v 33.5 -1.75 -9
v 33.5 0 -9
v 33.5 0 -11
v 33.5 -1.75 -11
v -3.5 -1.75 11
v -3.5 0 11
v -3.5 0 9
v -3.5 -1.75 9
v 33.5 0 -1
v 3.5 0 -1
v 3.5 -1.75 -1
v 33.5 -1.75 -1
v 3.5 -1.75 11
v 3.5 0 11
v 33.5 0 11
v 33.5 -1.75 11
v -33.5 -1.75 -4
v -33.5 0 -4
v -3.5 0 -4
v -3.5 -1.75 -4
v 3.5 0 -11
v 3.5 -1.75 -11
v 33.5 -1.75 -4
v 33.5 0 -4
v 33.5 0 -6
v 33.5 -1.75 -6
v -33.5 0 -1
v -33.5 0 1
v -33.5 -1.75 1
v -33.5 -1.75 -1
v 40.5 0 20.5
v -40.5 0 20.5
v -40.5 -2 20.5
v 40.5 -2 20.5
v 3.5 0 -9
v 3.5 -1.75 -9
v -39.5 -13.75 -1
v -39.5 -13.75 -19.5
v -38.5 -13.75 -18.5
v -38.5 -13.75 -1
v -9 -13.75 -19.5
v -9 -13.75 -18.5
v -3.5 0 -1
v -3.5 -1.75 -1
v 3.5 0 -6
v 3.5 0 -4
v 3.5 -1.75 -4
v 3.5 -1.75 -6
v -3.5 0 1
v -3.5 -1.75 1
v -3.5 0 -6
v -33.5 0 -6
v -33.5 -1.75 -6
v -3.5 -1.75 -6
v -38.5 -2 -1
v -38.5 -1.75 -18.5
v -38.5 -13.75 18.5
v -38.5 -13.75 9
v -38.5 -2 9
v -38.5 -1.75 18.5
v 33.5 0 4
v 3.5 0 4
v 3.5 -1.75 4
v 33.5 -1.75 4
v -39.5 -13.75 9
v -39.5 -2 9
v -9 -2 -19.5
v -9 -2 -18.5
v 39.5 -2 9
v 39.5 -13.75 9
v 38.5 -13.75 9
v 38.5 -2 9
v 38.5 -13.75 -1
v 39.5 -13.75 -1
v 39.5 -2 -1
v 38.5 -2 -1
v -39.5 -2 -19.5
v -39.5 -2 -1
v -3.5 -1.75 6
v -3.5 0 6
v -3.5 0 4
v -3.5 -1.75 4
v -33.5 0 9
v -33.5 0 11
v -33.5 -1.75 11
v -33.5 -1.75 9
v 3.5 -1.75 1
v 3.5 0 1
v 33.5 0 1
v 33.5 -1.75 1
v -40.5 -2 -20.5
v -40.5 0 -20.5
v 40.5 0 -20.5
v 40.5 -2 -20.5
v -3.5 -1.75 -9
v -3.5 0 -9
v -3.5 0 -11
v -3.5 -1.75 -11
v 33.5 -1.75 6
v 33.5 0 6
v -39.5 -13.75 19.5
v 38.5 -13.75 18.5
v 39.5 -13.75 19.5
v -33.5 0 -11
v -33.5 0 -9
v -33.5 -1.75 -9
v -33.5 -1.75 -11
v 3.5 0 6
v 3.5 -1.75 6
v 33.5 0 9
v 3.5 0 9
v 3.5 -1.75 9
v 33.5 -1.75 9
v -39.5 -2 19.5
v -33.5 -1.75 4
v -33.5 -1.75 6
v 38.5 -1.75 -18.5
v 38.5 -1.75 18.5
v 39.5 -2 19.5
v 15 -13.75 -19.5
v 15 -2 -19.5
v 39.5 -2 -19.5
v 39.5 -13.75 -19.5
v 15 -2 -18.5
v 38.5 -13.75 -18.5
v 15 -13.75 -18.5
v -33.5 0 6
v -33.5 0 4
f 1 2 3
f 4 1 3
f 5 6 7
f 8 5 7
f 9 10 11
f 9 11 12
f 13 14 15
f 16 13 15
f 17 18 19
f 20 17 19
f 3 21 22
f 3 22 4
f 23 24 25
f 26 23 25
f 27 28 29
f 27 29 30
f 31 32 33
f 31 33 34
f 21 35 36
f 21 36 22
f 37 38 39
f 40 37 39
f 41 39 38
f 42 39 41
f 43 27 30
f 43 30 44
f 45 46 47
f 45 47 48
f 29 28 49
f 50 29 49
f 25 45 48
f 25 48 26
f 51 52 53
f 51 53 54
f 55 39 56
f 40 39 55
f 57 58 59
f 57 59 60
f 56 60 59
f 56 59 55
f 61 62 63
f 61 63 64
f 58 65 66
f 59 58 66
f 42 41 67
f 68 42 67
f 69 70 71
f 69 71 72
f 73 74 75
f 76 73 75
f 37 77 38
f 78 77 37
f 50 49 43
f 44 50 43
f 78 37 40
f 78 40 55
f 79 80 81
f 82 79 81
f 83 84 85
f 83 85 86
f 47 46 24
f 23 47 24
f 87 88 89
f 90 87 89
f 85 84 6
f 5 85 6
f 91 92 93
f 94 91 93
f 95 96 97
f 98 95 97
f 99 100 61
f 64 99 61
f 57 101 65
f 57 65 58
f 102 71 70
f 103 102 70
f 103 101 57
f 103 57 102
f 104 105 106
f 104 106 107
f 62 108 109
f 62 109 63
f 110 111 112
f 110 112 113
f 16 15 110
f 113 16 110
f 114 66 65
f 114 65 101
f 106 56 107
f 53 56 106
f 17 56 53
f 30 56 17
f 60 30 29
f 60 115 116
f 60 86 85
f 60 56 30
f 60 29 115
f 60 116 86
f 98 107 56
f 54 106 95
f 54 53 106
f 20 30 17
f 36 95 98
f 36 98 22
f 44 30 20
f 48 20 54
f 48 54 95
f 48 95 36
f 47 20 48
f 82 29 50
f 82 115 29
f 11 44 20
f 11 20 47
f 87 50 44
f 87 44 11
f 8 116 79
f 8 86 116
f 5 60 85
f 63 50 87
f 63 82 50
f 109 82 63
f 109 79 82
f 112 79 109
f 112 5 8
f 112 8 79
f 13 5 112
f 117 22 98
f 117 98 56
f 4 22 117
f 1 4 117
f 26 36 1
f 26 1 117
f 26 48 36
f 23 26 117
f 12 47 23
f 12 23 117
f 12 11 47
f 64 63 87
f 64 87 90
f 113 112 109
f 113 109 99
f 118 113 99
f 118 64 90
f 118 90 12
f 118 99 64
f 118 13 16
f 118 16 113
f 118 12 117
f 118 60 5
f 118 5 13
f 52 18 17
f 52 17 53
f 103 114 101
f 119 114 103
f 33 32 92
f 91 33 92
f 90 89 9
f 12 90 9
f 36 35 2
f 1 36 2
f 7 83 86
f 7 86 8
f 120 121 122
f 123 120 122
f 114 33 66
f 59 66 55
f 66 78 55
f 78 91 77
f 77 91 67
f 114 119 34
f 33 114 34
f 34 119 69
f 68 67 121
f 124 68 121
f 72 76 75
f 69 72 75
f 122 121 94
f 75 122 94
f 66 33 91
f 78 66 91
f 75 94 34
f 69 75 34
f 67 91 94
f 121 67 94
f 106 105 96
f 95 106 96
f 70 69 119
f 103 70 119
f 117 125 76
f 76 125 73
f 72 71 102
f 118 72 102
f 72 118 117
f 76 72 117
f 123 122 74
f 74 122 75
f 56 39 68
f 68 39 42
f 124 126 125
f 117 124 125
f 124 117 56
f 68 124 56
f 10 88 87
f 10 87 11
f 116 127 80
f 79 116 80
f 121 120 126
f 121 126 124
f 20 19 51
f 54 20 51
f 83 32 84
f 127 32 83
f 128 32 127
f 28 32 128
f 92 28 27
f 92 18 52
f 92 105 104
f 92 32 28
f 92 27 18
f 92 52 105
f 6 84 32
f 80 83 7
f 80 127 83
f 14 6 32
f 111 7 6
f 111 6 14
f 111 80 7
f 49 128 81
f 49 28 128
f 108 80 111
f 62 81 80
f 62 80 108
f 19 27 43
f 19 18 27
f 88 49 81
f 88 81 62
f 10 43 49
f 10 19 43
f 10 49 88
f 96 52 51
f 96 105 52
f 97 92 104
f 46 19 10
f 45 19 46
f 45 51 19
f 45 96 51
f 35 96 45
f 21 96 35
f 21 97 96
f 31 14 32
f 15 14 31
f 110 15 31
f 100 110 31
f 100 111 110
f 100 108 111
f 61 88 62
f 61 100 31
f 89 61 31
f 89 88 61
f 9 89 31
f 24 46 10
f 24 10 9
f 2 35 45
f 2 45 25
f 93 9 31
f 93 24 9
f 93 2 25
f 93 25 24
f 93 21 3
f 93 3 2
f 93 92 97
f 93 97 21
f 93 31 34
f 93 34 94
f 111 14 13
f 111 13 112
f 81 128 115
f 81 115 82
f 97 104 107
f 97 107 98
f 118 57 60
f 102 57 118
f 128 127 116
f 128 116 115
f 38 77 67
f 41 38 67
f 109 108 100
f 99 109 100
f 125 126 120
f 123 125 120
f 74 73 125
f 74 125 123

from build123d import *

# Parameters (mm, degrees)
SKETCH011_W     = 81
SKETCH011_H     = 41
PAD002_DEPTH    = 2
SKETCH012_W     = 79
SKETCH012_H     = 39
PAD003_DEPTH    = 12
SKETCH059_W     = 77
SKETCH059_H     = 37
POCKET022_DEPTH = 12
SKETCH060_W     = 30
SKETCH060_H     = 2
POCKET023_DEPTH = 2
SKETCH061_W     = 24
SKETCH061_H     = 11.75
POCKET024_DEPTH = 2
SKETCH103_W     = 10
SKETCH103_H     = 11.75
POCKET038_DEPTH = 2
SKETCH104_W     = 10
SKETCH104_H     = 11.75
POCKET039_DEPTH = 2


with BuildPart() as part:
    # Sketch011 (on DatumPlane) → Pad002 (new body)
    with BuildSketch(Plane(origin=(0, 0, 0), x_dir=(1, 0, 0), z_dir=(0, 1, 0))):
        Rectangle(SKETCH011_W, SKETCH011_H)
    extrude(amount=-PAD002_DEPTH)

    # Sketch012 → Pad003 (join)
    with BuildSketch(Plane.XZ.offset(1.75)):
        Rectangle(SKETCH012_W, SKETCH012_H)
    extrude(amount=PAD003_DEPTH)

    # Sketch059 (on Face11 of Pad003) → Pocket022 (cut)
    with BuildSketch(Plane.XZ.offset(13.75)):
        Rectangle(SKETCH059_W, SKETCH059_H)
    extrude(amount=-POCKET022_DEPTH, mode=Mode.SUBTRACT)

    # Sketch060 (on Face4 of Pocket022) → Pocket023 (cut)
    with BuildSketch(Plane(origin=(0, 0, 0), x_dir=(1, 0, 0), z_dir=(0, 1, 0))):
        with Locations((18.5, -10)):
            Rectangle(SKETCH060_W, SKETCH060_H)
        with Locations((18.5, -5)):
            Rectangle(SKETCH060_W, SKETCH060_H)
        with Locations((18.5, 0)):
            Rectangle(SKETCH060_W, SKETCH060_H)
        with Locations((18.5, 5)):
            Rectangle(SKETCH060_W, SKETCH060_H)
        with Locations((18.5, 10)):
            Rectangle(SKETCH060_W, SKETCH060_H)
        with Locations((-18.5, -10)):
            Rectangle(SKETCH060_W, SKETCH060_H)
        with Locations((-18.5, -5)):
            Rectangle(SKETCH060_W, SKETCH060_H)
        with Locations((-18.5, 0)):
            Rectangle(SKETCH060_W, SKETCH060_H)
        with Locations((-18.5, 5)):
            Rectangle(SKETCH060_W, SKETCH060_H)
        with Locations((-18.5, 10)):
            Rectangle(SKETCH060_W, SKETCH060_H)
    extrude(amount=-POCKET023_DEPTH, mode=Mode.SUBTRACT)

    # Sketch061 (on Face50 of Pocket023) → Pocket024 (cut)
    with BuildSketch(Plane(origin=(0, 0, -19.5), x_dir=(-1, 0, 0), z_dir=(0, 0, -1))):
        with Locations((-3, -7.875)):
            Rectangle(SKETCH061_W, SKETCH061_H)
    extrude(amount=-POCKET024_DEPTH, mode=Mode.SUBTRACT)

    # Sketch103 (on Face1 of Pocket024) → Pocket038 (cut)
    with BuildSketch(Plane.ZY.offset(39.5)):
        with Locations((4, -7.875)):
            Rectangle(SKETCH103_W, SKETCH103_H)
    extrude(amount=-POCKET038_DEPTH, mode=Mode.SUBTRACT)

    # Sketch104 (on Face15 of Pocket038) → Pocket039 (cut)
    with BuildSketch(Plane(origin=(39.5, 0, 0), x_dir=(0, 0, -1), z_dir=(1, 0, 0))):
        with Locations((-4, -7.875)):
            Rectangle(SKETCH104_W, SKETCH104_H)
    extrude(amount=-POCKET039_DEPTH, mode=Mode.SUBTRACT)


solid = part.part
